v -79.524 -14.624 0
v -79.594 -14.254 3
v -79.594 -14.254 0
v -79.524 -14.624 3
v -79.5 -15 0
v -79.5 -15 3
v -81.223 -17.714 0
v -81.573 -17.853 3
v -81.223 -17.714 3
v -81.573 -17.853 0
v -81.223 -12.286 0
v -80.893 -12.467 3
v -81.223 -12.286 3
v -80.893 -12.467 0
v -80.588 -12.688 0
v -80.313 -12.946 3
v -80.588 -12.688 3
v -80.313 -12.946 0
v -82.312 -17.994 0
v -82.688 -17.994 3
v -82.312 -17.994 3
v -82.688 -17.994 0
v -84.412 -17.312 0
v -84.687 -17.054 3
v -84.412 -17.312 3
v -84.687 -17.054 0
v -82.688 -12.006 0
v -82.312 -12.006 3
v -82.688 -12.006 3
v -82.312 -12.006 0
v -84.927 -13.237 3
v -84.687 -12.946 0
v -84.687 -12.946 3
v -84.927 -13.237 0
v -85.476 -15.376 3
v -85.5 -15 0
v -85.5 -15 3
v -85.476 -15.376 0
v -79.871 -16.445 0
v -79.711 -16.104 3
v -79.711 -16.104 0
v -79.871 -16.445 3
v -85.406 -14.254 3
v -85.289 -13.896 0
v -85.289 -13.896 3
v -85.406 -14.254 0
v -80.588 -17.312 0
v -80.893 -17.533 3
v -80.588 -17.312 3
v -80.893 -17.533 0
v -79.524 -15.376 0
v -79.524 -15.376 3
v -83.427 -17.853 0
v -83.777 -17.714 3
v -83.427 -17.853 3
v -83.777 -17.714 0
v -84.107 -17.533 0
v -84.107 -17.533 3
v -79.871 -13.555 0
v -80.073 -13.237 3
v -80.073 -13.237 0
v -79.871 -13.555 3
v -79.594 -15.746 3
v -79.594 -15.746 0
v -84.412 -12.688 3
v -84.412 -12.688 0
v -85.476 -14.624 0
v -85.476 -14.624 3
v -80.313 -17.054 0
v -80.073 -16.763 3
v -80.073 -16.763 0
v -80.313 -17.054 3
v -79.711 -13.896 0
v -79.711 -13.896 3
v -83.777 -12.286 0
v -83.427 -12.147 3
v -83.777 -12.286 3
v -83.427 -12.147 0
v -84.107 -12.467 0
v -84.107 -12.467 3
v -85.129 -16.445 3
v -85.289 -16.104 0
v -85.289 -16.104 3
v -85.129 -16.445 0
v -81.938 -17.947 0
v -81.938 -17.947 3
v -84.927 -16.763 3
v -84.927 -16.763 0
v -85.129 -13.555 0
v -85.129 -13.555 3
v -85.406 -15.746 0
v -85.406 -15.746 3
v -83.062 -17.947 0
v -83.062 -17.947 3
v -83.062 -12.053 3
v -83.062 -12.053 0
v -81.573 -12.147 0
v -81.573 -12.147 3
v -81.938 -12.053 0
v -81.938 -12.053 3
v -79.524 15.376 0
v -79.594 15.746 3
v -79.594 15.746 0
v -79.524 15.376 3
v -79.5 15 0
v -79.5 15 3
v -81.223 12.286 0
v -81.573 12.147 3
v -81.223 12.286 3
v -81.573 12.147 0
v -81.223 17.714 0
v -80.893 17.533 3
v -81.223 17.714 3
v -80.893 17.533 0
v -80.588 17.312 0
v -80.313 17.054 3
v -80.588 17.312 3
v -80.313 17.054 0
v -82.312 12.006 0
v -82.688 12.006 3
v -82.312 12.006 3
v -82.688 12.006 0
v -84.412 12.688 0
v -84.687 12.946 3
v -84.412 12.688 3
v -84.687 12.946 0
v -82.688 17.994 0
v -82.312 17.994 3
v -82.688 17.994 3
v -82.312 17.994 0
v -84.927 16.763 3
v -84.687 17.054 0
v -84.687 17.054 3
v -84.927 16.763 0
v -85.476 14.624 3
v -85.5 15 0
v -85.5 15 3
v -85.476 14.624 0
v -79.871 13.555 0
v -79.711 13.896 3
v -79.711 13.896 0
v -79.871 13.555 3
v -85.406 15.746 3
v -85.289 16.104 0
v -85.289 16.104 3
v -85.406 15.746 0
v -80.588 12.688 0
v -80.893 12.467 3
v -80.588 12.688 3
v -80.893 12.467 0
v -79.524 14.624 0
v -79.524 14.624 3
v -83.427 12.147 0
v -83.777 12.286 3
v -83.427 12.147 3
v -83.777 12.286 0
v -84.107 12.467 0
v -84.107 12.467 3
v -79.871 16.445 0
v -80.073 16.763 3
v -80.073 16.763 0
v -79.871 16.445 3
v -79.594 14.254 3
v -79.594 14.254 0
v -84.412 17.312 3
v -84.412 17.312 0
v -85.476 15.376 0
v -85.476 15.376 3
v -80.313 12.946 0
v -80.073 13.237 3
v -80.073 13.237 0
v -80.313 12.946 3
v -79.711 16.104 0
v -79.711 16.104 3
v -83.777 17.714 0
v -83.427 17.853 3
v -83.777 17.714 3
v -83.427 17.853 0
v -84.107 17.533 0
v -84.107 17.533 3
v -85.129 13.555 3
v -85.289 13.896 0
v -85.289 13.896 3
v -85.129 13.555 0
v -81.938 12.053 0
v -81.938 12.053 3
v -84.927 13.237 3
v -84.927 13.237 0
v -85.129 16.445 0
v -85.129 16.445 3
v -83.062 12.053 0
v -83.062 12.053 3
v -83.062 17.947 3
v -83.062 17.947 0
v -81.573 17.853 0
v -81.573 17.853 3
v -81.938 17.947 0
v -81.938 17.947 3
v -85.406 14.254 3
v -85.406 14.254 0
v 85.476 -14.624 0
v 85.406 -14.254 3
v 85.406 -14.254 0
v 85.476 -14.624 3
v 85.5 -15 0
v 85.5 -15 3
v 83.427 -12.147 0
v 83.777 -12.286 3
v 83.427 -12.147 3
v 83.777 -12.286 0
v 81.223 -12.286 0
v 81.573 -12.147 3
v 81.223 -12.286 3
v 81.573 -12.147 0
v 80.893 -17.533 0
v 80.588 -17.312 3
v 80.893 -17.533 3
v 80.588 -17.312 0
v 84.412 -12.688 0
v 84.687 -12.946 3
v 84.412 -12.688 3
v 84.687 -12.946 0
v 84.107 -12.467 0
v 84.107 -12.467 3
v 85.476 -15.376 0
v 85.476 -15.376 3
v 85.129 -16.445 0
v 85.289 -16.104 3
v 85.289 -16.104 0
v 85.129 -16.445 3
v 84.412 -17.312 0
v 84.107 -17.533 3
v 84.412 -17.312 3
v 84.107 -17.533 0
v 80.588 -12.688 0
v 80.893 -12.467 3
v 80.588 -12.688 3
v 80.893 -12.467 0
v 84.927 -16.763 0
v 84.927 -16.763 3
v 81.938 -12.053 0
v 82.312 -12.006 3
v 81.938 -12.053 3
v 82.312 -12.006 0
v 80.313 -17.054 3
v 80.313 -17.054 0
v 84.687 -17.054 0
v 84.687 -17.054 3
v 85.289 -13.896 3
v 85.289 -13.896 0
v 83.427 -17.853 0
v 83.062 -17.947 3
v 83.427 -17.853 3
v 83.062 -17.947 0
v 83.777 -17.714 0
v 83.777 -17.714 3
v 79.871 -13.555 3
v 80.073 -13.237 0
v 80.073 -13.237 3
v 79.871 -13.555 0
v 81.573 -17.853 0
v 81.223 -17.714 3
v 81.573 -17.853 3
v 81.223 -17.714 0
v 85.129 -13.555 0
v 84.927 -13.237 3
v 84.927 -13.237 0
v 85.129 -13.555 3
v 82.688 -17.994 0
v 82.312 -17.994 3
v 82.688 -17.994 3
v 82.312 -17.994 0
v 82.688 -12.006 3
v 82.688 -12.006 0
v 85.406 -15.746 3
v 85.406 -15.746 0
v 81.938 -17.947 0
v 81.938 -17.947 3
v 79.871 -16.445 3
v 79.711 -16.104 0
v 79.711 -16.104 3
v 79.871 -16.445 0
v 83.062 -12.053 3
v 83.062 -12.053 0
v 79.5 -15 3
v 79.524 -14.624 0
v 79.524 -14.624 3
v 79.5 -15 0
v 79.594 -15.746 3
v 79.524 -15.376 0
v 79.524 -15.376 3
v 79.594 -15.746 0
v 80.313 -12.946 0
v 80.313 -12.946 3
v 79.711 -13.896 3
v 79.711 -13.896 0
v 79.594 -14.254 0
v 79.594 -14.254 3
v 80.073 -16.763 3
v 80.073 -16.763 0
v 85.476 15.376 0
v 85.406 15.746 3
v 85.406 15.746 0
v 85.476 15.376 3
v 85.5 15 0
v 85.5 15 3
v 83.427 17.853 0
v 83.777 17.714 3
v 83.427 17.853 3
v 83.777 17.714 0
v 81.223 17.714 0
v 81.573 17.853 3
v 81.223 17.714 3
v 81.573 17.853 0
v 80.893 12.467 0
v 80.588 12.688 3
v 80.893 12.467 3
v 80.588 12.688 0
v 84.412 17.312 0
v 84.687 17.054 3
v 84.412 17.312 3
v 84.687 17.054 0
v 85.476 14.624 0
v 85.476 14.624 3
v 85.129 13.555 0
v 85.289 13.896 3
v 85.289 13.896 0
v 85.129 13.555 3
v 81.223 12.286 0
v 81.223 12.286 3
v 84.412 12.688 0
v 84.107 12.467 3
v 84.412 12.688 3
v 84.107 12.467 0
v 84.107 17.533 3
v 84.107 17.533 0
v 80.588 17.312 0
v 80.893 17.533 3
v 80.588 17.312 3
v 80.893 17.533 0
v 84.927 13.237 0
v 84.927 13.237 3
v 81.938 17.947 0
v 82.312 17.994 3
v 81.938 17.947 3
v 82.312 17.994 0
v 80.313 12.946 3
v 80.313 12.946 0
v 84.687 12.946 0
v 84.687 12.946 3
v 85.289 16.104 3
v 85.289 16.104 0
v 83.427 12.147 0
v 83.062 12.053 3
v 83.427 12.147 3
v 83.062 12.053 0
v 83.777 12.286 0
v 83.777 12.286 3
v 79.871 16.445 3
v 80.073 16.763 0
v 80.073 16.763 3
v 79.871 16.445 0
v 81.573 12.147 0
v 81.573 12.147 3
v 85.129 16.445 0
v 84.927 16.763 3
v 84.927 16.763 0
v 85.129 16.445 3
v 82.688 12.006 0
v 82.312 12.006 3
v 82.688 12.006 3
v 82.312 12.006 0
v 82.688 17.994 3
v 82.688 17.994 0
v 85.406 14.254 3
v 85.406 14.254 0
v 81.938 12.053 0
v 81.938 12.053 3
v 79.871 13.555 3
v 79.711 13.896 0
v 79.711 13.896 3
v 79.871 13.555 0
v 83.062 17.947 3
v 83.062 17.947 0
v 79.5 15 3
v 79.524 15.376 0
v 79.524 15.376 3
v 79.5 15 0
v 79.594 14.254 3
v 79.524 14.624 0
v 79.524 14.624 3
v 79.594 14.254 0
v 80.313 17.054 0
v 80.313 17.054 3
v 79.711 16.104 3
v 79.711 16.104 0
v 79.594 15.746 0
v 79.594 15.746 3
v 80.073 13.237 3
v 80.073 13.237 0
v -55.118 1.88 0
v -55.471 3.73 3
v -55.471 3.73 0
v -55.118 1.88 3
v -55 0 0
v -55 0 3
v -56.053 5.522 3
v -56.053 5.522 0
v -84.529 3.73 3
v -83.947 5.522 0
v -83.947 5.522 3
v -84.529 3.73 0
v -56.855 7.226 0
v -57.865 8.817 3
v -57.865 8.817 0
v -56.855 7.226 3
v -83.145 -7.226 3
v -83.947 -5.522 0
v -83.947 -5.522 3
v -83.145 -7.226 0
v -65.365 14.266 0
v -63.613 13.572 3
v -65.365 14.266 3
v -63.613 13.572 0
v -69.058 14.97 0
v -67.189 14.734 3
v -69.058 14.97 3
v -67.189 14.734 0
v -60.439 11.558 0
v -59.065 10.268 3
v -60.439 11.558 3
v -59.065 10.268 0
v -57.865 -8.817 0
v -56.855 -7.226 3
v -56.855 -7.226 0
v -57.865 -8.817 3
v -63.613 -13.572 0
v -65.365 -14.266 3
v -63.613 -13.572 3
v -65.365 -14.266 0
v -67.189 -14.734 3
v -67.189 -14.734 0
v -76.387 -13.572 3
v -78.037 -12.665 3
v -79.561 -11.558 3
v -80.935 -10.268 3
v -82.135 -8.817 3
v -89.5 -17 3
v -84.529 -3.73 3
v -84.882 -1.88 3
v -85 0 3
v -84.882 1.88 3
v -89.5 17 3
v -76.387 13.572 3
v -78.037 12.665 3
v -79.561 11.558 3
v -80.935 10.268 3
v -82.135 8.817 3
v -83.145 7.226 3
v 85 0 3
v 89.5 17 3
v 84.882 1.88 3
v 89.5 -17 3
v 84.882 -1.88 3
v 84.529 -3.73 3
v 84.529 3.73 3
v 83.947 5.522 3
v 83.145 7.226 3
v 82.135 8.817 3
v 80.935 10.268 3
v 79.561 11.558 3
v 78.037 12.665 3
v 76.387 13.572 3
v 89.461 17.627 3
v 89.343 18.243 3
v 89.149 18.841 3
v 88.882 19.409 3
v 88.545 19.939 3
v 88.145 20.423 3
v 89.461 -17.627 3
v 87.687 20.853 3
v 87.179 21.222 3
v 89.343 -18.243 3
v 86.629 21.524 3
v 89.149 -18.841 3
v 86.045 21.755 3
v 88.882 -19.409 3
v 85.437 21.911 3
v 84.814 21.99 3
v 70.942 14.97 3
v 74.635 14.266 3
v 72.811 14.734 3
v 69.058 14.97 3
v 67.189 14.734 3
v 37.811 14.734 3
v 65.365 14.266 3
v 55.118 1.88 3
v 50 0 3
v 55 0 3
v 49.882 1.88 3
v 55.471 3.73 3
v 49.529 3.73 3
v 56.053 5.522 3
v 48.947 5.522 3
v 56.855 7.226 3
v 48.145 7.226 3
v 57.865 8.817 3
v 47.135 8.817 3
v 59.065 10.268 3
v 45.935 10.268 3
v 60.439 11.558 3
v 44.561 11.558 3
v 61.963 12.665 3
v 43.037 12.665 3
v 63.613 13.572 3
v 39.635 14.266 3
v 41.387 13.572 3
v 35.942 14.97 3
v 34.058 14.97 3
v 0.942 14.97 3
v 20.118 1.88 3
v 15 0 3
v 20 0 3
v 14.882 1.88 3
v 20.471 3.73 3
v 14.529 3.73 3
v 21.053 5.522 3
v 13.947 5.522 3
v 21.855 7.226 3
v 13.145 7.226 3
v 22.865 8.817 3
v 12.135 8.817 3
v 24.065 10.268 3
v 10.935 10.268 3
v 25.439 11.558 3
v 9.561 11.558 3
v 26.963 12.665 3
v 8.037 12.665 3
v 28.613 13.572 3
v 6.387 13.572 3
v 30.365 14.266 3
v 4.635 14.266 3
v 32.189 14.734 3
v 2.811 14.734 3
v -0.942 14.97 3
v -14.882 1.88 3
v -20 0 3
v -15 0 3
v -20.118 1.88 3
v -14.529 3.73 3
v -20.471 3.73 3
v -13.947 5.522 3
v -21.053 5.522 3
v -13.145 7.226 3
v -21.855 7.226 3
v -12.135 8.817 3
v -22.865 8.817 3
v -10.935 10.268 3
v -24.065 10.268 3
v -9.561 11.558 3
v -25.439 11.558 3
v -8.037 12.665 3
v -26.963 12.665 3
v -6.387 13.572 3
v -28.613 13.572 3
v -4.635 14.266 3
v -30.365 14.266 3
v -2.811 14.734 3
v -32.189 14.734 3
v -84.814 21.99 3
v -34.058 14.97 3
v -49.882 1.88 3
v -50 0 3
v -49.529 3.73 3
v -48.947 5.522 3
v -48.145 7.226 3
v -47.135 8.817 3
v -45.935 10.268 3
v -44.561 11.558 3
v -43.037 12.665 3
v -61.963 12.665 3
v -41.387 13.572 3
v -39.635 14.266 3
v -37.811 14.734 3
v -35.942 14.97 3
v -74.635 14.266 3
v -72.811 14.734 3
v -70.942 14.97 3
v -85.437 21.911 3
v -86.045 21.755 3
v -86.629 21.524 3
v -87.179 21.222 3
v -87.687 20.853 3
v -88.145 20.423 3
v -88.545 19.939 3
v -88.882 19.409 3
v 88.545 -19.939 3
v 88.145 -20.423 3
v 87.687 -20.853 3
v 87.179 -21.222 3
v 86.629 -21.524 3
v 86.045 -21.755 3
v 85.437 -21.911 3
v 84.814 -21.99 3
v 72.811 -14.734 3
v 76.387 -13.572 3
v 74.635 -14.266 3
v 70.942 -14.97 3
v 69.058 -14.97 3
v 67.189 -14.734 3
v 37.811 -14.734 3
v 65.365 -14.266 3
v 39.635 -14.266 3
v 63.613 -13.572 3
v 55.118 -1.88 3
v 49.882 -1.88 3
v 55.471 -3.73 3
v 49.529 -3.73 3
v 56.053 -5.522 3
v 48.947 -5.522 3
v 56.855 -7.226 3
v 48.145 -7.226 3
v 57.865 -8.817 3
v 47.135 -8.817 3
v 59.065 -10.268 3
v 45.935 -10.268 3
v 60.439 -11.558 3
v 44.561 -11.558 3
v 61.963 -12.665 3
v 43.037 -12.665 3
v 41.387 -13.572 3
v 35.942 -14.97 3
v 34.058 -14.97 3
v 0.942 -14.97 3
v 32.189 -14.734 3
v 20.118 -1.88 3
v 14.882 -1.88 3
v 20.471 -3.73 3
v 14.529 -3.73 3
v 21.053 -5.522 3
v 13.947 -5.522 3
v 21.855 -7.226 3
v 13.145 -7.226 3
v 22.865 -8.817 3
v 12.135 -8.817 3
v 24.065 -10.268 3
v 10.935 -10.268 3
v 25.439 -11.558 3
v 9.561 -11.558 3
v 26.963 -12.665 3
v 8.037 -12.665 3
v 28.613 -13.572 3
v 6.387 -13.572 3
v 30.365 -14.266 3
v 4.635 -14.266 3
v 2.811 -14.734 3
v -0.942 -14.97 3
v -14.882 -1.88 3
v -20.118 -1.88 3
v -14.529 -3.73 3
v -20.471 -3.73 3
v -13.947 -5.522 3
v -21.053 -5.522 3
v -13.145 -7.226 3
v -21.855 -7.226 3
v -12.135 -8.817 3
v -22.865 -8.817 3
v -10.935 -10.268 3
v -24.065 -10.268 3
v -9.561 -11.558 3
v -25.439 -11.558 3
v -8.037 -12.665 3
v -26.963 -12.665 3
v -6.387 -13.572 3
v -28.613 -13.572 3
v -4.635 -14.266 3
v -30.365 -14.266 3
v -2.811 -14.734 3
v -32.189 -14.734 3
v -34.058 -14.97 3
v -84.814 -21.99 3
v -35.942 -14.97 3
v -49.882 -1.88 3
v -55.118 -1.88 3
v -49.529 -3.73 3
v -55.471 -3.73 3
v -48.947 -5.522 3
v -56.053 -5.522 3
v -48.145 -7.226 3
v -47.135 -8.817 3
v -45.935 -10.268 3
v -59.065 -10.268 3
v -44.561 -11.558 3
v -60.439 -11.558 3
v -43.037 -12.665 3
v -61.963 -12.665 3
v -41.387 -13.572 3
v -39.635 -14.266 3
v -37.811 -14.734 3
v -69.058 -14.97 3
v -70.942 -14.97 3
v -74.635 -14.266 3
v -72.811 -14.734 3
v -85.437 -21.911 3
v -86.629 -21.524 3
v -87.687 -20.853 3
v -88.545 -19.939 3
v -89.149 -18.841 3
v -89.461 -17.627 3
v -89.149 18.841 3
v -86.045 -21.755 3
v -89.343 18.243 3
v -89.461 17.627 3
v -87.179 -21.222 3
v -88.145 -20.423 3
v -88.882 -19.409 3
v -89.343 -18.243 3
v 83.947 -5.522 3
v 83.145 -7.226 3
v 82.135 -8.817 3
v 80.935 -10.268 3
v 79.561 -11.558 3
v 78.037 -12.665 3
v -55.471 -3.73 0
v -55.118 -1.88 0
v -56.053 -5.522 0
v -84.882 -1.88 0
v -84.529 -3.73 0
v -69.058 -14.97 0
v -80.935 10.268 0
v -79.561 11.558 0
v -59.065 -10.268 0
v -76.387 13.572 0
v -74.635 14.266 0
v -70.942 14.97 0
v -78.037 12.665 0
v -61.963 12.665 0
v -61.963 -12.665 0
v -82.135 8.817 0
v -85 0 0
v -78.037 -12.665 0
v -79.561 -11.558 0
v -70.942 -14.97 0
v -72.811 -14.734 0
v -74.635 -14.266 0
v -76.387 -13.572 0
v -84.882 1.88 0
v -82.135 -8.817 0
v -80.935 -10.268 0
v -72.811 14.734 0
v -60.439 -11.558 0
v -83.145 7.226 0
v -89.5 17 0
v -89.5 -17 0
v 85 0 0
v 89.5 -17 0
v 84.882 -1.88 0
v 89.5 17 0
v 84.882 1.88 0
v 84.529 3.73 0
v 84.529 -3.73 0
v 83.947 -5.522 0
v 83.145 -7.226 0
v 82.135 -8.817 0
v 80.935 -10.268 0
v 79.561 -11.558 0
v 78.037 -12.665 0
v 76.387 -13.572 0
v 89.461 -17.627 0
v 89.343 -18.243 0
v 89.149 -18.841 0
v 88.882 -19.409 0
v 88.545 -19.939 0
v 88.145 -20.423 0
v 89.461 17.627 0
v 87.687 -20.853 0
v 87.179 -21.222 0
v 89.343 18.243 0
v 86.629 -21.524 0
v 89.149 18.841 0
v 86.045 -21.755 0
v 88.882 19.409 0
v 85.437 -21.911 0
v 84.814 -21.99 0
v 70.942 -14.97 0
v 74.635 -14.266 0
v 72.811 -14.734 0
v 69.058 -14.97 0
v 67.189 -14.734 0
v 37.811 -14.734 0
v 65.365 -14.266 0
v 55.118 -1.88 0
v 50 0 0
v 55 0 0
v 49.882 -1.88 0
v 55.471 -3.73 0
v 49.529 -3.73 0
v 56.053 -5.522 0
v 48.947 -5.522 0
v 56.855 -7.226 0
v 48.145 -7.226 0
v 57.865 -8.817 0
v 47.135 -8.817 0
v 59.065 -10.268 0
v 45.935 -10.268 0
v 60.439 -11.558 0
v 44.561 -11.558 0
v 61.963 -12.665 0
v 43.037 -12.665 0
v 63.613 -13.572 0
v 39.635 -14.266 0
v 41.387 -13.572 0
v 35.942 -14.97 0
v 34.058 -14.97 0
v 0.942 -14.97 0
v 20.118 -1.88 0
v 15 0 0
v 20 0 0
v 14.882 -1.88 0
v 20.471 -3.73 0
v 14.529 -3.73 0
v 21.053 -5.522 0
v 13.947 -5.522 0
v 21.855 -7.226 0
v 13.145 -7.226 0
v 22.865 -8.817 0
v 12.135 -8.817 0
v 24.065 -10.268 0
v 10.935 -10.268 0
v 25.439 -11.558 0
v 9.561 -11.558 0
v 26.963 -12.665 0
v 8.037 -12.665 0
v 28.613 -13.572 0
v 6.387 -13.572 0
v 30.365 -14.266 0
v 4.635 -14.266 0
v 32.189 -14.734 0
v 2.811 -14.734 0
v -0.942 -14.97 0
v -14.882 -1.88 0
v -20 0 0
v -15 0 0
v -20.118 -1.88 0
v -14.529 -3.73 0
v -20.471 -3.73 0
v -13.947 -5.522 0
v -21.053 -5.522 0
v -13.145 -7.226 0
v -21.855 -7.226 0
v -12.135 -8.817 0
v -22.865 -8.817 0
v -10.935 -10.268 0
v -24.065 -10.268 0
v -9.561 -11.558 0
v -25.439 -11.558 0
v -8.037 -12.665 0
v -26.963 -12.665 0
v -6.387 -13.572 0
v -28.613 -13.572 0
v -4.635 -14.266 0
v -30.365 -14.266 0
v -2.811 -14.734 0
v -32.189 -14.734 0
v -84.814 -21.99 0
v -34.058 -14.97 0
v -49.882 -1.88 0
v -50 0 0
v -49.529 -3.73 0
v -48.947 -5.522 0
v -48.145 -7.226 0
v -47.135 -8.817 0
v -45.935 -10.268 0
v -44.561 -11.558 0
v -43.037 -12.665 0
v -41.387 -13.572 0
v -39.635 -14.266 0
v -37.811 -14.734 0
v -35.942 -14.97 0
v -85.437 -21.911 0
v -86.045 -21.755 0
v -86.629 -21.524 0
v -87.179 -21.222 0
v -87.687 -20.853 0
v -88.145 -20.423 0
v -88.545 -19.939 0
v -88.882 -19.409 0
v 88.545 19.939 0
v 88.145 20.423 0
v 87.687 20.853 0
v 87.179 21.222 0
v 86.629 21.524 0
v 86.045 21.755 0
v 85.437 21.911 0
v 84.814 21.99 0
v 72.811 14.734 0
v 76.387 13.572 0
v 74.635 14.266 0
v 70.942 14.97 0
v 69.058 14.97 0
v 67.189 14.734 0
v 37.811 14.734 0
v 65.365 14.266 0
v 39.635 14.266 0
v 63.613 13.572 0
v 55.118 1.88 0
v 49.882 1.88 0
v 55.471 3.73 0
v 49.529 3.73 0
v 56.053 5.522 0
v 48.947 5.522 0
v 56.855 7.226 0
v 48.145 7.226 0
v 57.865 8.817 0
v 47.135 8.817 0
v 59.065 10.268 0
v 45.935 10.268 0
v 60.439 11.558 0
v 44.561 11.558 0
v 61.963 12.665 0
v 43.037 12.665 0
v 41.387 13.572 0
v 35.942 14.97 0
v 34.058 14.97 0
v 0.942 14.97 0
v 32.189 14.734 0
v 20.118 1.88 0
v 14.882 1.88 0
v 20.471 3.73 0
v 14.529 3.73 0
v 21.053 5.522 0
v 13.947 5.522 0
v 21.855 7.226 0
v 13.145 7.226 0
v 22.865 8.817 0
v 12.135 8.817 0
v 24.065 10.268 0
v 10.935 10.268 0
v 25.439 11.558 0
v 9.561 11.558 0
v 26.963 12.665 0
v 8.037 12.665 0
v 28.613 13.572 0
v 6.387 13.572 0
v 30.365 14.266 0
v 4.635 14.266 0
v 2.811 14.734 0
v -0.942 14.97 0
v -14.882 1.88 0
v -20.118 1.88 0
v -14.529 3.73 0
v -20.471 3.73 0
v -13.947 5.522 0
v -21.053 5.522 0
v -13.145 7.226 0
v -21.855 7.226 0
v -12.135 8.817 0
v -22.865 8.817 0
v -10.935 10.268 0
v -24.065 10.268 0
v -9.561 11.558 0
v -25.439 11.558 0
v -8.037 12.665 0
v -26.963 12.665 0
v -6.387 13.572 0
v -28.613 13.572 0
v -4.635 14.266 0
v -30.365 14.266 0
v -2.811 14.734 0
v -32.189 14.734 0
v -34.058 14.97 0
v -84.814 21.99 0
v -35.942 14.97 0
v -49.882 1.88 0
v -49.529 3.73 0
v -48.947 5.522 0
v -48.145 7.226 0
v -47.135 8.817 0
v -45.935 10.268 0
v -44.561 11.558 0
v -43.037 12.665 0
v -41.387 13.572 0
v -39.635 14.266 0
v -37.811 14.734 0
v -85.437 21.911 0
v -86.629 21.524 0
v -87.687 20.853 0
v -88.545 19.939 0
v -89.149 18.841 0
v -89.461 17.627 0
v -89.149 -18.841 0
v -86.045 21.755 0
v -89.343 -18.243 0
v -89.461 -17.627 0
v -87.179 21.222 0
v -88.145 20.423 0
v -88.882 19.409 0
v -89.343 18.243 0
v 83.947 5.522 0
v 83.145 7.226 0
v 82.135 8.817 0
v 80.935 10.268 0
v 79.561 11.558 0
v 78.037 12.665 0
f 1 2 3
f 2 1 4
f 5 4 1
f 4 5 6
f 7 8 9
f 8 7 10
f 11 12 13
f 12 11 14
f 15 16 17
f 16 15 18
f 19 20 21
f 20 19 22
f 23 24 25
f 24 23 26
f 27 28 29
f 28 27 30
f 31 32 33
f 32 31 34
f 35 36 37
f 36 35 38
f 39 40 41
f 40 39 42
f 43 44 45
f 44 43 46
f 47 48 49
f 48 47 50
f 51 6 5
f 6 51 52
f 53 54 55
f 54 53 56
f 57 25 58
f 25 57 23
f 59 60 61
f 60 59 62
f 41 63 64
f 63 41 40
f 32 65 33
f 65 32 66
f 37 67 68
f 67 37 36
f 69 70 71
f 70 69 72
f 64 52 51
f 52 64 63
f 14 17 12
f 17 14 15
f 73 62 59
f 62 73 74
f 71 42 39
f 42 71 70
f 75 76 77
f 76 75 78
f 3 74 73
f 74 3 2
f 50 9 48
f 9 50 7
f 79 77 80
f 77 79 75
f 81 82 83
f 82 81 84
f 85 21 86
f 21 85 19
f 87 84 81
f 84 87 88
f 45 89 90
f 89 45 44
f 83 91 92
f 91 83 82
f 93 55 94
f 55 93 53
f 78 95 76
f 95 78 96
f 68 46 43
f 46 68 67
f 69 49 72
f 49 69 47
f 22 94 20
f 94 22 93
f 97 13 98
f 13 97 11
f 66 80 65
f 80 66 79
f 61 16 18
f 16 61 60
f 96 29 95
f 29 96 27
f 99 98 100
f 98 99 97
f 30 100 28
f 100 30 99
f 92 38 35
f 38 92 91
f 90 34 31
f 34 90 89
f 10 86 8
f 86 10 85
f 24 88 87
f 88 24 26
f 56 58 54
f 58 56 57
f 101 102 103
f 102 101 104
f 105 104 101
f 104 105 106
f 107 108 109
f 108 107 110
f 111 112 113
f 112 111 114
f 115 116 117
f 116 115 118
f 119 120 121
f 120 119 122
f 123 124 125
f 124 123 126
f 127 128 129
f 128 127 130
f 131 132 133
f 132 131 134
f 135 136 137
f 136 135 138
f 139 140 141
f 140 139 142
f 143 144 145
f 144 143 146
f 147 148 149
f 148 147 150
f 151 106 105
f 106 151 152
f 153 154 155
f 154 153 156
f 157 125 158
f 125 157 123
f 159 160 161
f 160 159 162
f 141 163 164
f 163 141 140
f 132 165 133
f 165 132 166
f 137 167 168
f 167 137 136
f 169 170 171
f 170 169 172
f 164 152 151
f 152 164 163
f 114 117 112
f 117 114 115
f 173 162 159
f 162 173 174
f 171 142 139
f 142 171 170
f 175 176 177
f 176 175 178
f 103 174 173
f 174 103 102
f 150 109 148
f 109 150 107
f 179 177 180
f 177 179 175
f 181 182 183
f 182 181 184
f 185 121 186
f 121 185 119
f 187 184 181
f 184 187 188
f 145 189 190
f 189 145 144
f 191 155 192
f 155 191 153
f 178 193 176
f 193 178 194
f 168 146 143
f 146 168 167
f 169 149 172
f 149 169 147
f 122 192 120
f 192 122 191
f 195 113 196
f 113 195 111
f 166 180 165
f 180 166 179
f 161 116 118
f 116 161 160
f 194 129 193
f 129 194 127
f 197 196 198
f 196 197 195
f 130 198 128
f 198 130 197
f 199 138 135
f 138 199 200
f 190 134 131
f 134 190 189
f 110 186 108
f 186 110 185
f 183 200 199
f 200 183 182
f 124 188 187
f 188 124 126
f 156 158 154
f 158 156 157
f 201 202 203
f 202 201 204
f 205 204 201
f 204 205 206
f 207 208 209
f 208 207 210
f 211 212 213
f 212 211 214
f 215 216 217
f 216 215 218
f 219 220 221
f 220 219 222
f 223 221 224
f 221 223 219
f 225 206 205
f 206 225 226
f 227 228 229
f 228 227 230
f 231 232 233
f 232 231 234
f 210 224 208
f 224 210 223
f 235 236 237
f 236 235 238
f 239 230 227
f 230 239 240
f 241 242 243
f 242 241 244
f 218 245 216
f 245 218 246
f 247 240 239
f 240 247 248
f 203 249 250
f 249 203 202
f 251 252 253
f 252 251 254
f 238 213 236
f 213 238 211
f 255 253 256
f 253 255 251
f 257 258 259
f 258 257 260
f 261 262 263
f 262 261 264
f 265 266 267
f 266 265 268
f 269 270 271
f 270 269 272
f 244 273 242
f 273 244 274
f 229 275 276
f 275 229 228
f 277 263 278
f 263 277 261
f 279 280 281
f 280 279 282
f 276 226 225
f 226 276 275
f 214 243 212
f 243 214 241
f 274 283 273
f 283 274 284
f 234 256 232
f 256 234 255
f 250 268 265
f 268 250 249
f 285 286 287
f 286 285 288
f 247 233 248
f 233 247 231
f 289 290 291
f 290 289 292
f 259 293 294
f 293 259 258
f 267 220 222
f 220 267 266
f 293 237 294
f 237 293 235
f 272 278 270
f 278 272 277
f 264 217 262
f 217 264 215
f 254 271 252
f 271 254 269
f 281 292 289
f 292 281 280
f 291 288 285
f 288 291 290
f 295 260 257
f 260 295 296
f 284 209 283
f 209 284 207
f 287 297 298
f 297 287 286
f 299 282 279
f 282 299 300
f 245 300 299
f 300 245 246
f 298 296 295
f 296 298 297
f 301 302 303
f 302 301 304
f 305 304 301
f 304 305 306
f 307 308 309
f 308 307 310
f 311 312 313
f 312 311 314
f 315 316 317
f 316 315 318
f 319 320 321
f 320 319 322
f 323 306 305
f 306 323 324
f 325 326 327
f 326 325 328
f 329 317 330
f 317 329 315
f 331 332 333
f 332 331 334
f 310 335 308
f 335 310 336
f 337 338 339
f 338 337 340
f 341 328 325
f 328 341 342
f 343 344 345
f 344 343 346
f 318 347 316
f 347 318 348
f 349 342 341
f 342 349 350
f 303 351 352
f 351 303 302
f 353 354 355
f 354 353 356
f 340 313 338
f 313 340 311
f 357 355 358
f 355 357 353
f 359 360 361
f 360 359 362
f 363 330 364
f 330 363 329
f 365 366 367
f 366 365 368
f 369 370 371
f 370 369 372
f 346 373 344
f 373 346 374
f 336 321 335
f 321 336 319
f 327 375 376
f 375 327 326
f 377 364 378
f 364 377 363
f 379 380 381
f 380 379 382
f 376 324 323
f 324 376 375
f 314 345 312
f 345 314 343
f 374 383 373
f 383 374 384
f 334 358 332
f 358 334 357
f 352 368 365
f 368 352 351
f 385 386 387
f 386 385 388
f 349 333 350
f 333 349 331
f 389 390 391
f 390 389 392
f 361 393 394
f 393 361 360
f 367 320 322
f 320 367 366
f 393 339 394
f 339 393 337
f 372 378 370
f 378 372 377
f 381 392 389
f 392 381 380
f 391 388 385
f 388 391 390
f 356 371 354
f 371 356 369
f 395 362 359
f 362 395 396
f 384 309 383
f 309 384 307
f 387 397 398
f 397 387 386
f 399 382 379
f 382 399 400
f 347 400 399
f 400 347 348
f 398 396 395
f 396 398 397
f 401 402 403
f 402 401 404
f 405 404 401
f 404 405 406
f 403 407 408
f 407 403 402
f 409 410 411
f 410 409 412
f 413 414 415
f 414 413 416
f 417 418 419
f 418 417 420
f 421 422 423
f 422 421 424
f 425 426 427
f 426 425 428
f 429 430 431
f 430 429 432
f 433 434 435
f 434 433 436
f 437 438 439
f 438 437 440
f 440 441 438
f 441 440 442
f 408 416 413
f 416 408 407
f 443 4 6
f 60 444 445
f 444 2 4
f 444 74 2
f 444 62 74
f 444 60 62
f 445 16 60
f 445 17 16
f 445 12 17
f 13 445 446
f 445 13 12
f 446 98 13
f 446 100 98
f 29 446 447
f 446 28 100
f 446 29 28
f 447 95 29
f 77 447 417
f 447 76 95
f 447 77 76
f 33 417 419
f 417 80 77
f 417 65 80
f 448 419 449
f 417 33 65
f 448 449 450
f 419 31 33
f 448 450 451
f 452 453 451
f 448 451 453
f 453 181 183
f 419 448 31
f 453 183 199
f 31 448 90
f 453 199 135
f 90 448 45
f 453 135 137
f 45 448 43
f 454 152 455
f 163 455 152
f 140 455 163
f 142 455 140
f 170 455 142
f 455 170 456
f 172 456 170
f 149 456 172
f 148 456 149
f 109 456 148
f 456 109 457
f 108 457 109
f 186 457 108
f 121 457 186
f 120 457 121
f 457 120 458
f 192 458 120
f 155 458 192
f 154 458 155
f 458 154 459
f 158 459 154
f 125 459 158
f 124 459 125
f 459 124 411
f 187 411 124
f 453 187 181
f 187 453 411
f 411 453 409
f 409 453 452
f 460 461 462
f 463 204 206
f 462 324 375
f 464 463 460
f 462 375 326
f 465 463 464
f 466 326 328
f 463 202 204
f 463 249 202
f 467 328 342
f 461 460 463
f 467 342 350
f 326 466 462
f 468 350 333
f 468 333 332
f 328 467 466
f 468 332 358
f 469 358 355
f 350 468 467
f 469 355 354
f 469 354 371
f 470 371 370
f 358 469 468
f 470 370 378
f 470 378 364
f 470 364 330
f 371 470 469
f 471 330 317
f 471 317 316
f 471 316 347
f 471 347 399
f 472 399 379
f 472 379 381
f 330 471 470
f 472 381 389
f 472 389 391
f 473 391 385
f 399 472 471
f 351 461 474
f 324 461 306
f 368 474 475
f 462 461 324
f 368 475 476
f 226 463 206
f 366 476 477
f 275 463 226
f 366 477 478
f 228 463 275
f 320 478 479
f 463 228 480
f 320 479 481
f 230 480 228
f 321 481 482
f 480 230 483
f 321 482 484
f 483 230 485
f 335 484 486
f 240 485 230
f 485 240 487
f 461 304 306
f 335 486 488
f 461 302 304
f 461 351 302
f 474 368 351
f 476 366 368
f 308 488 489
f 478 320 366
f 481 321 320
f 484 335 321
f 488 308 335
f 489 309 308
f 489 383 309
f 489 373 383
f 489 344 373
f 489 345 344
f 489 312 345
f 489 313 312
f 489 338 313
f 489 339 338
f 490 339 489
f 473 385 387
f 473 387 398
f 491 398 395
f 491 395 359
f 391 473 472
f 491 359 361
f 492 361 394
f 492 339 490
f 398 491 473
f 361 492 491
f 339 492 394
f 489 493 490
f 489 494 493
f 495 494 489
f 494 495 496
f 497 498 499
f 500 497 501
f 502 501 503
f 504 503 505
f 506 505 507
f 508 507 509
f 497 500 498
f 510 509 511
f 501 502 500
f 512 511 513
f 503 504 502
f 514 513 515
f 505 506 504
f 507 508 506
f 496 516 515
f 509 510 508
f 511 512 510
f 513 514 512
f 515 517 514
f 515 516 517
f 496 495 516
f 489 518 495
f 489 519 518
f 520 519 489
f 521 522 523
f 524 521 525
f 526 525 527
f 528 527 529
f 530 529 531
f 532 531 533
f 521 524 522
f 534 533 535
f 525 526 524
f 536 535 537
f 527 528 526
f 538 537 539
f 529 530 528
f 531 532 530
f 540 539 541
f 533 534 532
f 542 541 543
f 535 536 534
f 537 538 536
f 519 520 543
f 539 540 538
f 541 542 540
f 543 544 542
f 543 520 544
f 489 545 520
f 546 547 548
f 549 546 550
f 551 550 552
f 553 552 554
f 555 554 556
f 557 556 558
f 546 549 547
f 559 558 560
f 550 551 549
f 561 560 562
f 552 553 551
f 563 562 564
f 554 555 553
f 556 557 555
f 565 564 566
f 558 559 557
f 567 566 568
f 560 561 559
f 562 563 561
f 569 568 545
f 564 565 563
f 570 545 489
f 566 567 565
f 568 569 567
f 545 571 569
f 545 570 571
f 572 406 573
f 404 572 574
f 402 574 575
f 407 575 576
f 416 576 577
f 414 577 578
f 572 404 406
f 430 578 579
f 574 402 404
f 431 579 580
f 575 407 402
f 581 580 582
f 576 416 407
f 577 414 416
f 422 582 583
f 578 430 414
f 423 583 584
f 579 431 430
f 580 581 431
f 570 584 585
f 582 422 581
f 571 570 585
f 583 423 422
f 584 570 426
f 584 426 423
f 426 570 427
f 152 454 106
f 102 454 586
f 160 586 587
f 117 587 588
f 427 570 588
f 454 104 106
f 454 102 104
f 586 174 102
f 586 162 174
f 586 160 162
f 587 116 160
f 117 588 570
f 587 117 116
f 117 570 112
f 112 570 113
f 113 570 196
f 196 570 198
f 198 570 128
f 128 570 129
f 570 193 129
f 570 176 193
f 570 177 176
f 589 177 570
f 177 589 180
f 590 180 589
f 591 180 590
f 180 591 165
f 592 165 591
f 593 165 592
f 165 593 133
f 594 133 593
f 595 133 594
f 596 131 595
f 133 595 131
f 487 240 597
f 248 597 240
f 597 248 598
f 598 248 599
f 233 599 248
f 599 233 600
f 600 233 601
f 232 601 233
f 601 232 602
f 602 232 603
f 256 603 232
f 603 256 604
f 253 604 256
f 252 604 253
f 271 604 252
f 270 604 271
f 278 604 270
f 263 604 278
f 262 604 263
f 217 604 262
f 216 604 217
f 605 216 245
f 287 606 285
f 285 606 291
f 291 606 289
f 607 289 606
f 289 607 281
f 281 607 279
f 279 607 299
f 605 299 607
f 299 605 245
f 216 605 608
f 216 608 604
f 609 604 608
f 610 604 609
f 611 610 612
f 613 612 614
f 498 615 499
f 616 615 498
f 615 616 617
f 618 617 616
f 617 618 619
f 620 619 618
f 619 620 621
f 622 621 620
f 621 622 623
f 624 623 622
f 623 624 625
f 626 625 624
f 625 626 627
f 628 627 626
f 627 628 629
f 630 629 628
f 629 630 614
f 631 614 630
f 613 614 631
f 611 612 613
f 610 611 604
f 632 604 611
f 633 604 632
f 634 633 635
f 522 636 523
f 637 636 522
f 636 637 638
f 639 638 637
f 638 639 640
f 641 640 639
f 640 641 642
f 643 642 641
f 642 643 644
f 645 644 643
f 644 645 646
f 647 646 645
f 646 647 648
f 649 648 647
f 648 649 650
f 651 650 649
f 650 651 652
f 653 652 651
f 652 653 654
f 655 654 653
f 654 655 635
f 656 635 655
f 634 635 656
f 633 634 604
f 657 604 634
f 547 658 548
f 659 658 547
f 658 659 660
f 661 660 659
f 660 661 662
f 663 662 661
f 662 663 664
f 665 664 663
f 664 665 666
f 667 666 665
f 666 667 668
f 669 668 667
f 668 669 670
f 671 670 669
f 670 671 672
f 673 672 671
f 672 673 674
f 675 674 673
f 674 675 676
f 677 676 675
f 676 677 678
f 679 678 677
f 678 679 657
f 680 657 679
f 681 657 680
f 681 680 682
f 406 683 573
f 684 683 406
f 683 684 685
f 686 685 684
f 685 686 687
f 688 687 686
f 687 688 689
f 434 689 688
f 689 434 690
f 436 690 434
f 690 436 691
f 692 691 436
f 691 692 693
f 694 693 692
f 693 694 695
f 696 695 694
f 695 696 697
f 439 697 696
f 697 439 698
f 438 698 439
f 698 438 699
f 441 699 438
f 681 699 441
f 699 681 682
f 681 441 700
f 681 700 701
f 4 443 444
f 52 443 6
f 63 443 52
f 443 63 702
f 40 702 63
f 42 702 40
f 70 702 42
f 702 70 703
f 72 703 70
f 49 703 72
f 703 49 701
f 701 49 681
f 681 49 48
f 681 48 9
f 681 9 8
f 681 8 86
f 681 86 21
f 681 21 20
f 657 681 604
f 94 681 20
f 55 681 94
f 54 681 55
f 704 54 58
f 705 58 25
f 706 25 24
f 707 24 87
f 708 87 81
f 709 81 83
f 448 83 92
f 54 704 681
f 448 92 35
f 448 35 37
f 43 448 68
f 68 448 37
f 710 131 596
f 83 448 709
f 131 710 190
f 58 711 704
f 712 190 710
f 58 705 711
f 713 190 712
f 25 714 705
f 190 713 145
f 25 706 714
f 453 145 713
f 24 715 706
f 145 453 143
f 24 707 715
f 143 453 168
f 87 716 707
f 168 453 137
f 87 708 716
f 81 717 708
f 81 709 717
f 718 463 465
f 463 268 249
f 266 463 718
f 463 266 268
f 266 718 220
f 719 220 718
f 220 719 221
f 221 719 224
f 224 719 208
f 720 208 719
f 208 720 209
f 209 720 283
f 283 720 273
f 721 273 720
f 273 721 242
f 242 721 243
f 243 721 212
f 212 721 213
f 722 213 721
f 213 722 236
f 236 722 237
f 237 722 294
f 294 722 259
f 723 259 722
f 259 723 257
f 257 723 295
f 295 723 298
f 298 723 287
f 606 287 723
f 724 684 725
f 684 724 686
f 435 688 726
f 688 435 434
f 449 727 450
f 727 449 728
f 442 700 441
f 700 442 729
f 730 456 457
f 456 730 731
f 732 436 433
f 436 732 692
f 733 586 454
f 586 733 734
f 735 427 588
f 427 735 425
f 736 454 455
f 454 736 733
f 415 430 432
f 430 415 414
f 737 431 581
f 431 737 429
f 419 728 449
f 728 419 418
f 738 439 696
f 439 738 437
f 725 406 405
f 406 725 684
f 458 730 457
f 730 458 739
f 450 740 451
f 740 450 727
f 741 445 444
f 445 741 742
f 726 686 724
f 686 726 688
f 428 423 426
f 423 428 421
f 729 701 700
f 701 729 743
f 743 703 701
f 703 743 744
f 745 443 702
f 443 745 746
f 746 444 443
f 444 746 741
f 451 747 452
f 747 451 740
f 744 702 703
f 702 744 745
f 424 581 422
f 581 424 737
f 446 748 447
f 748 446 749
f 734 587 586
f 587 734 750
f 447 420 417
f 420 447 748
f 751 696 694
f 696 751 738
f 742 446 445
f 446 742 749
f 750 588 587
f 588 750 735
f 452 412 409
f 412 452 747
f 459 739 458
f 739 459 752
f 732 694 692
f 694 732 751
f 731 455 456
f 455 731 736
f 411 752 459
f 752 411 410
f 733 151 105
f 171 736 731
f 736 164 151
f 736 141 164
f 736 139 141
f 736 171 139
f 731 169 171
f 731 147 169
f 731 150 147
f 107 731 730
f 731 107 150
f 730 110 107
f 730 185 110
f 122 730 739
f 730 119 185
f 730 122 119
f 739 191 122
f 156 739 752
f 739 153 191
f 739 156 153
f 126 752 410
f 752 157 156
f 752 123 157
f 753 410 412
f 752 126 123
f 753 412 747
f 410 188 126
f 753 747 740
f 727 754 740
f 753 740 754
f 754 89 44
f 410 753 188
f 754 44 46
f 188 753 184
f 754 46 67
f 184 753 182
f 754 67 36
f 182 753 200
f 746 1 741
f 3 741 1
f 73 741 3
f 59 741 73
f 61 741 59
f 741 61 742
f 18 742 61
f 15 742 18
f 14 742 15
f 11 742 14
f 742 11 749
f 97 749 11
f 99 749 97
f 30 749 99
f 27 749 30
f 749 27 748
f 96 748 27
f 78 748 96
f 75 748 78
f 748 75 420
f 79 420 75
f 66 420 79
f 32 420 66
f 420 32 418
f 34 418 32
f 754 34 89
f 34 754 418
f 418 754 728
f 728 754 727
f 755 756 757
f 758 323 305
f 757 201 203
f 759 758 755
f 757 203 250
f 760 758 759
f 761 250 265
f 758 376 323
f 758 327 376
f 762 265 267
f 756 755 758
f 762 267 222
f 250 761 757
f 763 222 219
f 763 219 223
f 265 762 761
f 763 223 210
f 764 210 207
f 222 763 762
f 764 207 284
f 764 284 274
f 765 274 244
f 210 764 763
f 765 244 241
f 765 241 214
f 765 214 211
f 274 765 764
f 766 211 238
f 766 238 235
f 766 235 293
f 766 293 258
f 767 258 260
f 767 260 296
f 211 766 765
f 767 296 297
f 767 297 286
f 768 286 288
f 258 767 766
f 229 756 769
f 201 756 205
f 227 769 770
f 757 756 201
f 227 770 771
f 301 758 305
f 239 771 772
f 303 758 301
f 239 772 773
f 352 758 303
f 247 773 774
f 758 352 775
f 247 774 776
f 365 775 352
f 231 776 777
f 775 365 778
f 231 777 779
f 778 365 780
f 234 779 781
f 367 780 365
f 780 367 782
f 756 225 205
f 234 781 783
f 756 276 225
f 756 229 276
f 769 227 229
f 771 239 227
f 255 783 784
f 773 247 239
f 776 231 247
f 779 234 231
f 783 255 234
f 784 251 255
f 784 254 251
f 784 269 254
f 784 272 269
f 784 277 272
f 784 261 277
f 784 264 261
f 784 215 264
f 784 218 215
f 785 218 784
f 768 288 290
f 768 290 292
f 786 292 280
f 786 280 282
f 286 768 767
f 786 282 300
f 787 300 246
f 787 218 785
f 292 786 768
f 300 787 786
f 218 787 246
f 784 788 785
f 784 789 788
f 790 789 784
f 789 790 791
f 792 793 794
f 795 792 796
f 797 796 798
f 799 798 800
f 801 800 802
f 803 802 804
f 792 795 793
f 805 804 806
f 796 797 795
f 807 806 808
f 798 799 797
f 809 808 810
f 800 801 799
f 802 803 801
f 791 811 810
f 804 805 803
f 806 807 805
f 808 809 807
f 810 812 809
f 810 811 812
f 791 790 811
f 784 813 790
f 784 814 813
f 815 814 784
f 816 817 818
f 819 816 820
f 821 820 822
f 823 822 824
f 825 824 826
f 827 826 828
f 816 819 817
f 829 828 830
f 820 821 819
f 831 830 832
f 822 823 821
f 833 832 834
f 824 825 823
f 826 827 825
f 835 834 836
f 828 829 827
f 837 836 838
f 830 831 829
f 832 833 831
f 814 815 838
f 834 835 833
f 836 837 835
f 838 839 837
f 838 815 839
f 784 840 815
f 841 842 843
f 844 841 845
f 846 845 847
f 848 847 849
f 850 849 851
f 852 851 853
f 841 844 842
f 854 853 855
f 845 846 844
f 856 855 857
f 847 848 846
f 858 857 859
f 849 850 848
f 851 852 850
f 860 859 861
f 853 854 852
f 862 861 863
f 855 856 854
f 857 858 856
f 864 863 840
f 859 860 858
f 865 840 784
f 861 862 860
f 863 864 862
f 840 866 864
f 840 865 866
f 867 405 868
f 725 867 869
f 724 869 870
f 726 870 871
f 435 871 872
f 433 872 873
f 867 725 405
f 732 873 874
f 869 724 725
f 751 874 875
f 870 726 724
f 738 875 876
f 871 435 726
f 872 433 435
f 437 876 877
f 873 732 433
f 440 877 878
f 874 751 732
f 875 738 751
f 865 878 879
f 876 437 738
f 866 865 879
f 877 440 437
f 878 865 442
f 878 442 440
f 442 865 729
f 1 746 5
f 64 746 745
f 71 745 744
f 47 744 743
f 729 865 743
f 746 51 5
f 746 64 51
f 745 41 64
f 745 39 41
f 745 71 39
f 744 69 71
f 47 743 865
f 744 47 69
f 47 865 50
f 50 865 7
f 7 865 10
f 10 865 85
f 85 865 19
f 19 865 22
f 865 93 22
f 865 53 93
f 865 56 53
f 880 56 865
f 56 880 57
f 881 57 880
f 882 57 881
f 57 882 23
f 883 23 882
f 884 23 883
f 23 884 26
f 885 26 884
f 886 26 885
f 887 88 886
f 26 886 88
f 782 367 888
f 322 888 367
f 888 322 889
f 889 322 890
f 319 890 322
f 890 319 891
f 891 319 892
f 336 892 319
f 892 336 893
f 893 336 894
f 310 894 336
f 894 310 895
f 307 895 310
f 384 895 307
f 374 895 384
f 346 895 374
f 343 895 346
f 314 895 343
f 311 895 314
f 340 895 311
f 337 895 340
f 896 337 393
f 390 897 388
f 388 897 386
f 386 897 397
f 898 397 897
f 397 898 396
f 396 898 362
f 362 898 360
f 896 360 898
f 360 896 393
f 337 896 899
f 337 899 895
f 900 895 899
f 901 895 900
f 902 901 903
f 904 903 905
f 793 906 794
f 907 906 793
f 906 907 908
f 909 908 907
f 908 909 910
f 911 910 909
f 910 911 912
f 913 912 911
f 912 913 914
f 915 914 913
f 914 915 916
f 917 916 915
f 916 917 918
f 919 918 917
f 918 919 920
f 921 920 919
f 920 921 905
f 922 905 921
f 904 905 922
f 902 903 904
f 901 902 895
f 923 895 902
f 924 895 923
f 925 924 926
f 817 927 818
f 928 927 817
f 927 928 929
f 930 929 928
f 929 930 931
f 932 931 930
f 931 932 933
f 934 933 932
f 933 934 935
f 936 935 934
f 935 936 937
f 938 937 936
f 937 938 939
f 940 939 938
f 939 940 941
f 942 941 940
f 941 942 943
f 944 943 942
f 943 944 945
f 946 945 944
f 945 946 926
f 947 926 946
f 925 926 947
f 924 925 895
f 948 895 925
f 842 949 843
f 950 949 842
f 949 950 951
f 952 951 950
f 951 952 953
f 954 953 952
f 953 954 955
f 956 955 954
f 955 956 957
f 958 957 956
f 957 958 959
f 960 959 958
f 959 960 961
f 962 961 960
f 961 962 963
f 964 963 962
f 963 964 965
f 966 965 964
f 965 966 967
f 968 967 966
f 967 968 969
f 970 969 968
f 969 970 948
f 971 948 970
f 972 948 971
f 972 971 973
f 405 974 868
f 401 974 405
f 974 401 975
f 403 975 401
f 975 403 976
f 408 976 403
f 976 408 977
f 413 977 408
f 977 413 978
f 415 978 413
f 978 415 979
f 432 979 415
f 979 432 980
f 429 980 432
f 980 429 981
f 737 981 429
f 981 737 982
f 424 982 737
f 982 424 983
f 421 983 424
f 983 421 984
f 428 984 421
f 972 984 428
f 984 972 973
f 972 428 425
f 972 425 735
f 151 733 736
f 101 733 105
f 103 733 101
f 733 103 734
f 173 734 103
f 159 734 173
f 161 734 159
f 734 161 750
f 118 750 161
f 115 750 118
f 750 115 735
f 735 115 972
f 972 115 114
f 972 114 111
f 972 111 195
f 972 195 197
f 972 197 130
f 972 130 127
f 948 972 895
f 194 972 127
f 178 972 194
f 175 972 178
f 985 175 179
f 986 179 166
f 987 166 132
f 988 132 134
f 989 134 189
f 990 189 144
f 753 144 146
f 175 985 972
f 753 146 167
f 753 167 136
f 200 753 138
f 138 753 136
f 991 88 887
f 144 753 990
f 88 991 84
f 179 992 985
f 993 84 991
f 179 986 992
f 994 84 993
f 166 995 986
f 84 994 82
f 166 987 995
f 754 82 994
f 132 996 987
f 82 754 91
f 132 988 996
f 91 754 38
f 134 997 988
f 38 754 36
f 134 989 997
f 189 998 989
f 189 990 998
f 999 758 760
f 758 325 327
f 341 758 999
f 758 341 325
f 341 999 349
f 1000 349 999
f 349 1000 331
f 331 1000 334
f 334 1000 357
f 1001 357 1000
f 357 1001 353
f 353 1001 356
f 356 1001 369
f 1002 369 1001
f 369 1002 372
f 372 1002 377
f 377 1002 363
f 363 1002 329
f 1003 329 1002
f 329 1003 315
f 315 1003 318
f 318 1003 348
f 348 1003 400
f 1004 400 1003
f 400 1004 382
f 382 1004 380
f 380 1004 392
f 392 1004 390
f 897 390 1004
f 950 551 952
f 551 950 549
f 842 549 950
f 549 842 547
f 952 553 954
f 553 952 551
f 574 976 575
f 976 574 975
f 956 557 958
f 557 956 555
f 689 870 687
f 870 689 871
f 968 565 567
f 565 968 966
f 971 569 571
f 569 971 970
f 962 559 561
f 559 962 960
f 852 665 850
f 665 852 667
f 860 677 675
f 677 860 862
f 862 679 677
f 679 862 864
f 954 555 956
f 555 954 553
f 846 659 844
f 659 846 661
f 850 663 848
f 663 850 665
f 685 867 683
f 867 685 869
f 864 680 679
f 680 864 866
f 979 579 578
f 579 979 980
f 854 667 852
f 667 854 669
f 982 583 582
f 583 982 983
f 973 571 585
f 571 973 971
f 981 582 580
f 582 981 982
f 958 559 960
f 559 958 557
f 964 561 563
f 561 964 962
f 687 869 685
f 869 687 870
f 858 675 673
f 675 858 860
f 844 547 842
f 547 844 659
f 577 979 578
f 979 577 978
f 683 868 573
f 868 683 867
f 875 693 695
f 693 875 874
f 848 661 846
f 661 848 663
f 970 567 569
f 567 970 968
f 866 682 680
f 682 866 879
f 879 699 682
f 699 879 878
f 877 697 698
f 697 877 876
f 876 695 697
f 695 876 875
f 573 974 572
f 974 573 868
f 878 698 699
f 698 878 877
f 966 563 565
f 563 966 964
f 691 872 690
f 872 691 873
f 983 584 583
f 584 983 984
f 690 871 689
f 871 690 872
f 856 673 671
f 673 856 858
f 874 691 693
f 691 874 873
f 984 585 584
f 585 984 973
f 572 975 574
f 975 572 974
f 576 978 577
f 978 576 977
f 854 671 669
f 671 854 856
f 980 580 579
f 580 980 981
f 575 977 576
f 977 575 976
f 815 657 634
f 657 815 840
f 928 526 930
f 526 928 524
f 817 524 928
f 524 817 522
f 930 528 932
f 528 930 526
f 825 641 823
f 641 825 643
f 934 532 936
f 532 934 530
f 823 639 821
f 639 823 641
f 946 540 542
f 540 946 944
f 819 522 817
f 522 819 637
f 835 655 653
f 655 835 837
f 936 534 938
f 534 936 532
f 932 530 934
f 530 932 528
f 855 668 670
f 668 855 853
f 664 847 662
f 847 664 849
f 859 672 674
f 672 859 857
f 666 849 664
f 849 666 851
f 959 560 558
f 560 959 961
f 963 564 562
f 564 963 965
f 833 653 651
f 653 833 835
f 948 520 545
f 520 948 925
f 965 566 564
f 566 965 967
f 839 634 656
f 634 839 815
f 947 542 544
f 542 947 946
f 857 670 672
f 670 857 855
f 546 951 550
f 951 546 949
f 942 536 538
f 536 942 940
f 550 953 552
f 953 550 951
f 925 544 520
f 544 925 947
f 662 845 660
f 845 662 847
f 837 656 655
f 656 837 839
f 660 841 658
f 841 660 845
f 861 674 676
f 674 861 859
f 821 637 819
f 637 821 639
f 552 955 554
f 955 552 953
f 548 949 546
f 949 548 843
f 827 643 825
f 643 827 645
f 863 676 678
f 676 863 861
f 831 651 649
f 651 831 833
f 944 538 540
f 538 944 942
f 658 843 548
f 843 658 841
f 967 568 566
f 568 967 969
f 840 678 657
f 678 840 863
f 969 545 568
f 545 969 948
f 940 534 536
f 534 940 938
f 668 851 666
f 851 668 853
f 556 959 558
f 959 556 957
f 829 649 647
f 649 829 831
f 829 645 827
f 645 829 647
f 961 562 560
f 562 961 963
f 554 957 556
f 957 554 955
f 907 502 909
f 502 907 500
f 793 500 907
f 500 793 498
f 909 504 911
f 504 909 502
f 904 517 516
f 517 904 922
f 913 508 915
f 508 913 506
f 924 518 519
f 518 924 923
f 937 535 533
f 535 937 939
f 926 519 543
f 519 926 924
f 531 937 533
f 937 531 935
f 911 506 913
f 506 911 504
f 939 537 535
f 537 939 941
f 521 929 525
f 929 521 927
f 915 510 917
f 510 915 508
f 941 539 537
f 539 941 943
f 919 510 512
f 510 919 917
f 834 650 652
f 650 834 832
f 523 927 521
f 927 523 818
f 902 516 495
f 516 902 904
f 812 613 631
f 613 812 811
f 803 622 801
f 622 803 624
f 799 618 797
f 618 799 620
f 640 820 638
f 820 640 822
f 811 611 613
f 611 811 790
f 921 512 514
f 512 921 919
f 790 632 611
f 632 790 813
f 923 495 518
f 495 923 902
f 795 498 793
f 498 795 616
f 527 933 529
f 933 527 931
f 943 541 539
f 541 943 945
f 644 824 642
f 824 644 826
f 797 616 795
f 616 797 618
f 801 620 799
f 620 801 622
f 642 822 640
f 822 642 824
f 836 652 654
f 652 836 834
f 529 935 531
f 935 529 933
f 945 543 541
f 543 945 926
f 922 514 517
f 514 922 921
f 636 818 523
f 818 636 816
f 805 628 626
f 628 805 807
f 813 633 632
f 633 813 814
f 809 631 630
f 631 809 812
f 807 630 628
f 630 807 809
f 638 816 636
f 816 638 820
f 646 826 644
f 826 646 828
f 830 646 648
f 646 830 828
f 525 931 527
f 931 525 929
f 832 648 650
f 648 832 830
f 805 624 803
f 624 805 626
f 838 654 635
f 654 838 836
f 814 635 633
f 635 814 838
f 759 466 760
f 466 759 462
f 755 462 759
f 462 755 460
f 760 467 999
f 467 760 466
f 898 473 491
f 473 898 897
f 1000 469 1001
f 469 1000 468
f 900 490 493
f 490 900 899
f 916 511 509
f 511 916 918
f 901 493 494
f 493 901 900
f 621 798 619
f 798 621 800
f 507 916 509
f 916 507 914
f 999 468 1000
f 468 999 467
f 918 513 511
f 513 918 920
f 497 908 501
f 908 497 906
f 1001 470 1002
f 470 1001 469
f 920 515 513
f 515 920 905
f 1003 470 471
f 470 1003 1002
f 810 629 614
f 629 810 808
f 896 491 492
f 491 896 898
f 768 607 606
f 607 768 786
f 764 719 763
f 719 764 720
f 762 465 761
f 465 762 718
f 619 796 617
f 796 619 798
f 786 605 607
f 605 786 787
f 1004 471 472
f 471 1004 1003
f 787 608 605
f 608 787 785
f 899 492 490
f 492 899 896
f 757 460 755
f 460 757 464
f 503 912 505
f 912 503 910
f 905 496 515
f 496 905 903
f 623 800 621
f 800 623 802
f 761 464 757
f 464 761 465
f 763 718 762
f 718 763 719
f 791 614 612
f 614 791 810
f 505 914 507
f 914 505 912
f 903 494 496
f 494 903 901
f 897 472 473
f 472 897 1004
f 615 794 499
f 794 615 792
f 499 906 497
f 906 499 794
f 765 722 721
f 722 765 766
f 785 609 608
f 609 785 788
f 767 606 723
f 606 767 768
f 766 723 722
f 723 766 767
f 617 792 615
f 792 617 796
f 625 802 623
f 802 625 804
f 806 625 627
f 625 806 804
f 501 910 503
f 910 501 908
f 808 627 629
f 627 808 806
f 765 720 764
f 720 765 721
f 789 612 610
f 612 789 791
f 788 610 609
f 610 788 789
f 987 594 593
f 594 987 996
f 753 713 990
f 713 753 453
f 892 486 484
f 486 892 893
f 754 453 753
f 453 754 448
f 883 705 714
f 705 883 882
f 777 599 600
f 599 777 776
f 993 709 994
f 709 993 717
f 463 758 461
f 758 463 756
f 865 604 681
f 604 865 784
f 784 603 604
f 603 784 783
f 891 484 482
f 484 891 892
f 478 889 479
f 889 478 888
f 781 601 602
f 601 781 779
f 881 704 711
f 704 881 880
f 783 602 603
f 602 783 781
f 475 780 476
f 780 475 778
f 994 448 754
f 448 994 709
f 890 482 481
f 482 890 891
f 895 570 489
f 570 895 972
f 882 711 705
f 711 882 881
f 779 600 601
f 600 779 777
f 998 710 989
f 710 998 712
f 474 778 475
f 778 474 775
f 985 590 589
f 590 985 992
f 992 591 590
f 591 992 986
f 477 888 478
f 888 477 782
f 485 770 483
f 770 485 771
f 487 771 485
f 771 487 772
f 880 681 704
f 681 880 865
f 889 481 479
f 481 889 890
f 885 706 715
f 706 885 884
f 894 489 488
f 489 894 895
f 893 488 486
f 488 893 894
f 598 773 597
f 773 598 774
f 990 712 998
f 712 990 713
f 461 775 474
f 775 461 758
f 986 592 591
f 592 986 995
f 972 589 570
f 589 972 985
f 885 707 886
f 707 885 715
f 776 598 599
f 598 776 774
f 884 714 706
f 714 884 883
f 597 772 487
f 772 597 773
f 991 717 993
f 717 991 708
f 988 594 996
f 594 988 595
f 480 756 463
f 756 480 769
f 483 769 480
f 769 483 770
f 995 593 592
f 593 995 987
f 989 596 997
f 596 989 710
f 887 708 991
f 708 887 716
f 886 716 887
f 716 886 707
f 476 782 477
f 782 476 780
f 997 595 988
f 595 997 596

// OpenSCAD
$fn = 50;


difference() {
	union() {
		hull() {
			translate(v = [-84.5000000000, 17.0000000000, 0]) {
				cylinder(h = 3, r = 5);
			}
			translate(v = [84.5000000000, 17.0000000000, 0]) {
				cylinder(h = 3, r = 5);
			}
			translate(v = [-84.5000000000, -17.0000000000, 0]) {
				cylinder(h = 3, r = 5);
			}
			translate(v = [84.5000000000, -17.0000000000, 0]) {
				cylinder(h = 3, r = 5);
			}
		}
	}
	union() {
		#translate(v = [-82.5000000000, -15.0000000000, -100.0000000000]) {
			cylinder(h = 200, r = 3.0000000000);
		}
		#translate(v = [-82.5000000000, 15.0000000000, -100.0000000000]) {
			cylinder(h = 200, r = 3.0000000000);
		}
		#translate(v = [82.5000000000, -15.0000000000, -100.0000000000]) {
			cylinder(h = 200, r = 3.0000000000);
		}
		#translate(v = [82.5000000000, 15.0000000000, -100.0000000000]) {
			cylinder(h = 200, r = 3.0000000000);
		}
		#translate(v = [-70.0000000000, 0, 0]) {
			cylinder(h = 3, r = 15.0000000000);
		}
		#translate(v = [-35.0000000000, 0, 0]) {
			cylinder(h = 3, r = 15.0000000000);
		}
		#cylinder(h = 3, r = 15.0000000000);
		#translate(v = [35.0000000000, 0, 0]) {
			cylinder(h = 3, r = 15.0000000000);
		}
		#translate(v = [70.0000000000, 0, 0]) {
			cylinder(h = 3, r = 15.0000000000);
		}
	}
}
